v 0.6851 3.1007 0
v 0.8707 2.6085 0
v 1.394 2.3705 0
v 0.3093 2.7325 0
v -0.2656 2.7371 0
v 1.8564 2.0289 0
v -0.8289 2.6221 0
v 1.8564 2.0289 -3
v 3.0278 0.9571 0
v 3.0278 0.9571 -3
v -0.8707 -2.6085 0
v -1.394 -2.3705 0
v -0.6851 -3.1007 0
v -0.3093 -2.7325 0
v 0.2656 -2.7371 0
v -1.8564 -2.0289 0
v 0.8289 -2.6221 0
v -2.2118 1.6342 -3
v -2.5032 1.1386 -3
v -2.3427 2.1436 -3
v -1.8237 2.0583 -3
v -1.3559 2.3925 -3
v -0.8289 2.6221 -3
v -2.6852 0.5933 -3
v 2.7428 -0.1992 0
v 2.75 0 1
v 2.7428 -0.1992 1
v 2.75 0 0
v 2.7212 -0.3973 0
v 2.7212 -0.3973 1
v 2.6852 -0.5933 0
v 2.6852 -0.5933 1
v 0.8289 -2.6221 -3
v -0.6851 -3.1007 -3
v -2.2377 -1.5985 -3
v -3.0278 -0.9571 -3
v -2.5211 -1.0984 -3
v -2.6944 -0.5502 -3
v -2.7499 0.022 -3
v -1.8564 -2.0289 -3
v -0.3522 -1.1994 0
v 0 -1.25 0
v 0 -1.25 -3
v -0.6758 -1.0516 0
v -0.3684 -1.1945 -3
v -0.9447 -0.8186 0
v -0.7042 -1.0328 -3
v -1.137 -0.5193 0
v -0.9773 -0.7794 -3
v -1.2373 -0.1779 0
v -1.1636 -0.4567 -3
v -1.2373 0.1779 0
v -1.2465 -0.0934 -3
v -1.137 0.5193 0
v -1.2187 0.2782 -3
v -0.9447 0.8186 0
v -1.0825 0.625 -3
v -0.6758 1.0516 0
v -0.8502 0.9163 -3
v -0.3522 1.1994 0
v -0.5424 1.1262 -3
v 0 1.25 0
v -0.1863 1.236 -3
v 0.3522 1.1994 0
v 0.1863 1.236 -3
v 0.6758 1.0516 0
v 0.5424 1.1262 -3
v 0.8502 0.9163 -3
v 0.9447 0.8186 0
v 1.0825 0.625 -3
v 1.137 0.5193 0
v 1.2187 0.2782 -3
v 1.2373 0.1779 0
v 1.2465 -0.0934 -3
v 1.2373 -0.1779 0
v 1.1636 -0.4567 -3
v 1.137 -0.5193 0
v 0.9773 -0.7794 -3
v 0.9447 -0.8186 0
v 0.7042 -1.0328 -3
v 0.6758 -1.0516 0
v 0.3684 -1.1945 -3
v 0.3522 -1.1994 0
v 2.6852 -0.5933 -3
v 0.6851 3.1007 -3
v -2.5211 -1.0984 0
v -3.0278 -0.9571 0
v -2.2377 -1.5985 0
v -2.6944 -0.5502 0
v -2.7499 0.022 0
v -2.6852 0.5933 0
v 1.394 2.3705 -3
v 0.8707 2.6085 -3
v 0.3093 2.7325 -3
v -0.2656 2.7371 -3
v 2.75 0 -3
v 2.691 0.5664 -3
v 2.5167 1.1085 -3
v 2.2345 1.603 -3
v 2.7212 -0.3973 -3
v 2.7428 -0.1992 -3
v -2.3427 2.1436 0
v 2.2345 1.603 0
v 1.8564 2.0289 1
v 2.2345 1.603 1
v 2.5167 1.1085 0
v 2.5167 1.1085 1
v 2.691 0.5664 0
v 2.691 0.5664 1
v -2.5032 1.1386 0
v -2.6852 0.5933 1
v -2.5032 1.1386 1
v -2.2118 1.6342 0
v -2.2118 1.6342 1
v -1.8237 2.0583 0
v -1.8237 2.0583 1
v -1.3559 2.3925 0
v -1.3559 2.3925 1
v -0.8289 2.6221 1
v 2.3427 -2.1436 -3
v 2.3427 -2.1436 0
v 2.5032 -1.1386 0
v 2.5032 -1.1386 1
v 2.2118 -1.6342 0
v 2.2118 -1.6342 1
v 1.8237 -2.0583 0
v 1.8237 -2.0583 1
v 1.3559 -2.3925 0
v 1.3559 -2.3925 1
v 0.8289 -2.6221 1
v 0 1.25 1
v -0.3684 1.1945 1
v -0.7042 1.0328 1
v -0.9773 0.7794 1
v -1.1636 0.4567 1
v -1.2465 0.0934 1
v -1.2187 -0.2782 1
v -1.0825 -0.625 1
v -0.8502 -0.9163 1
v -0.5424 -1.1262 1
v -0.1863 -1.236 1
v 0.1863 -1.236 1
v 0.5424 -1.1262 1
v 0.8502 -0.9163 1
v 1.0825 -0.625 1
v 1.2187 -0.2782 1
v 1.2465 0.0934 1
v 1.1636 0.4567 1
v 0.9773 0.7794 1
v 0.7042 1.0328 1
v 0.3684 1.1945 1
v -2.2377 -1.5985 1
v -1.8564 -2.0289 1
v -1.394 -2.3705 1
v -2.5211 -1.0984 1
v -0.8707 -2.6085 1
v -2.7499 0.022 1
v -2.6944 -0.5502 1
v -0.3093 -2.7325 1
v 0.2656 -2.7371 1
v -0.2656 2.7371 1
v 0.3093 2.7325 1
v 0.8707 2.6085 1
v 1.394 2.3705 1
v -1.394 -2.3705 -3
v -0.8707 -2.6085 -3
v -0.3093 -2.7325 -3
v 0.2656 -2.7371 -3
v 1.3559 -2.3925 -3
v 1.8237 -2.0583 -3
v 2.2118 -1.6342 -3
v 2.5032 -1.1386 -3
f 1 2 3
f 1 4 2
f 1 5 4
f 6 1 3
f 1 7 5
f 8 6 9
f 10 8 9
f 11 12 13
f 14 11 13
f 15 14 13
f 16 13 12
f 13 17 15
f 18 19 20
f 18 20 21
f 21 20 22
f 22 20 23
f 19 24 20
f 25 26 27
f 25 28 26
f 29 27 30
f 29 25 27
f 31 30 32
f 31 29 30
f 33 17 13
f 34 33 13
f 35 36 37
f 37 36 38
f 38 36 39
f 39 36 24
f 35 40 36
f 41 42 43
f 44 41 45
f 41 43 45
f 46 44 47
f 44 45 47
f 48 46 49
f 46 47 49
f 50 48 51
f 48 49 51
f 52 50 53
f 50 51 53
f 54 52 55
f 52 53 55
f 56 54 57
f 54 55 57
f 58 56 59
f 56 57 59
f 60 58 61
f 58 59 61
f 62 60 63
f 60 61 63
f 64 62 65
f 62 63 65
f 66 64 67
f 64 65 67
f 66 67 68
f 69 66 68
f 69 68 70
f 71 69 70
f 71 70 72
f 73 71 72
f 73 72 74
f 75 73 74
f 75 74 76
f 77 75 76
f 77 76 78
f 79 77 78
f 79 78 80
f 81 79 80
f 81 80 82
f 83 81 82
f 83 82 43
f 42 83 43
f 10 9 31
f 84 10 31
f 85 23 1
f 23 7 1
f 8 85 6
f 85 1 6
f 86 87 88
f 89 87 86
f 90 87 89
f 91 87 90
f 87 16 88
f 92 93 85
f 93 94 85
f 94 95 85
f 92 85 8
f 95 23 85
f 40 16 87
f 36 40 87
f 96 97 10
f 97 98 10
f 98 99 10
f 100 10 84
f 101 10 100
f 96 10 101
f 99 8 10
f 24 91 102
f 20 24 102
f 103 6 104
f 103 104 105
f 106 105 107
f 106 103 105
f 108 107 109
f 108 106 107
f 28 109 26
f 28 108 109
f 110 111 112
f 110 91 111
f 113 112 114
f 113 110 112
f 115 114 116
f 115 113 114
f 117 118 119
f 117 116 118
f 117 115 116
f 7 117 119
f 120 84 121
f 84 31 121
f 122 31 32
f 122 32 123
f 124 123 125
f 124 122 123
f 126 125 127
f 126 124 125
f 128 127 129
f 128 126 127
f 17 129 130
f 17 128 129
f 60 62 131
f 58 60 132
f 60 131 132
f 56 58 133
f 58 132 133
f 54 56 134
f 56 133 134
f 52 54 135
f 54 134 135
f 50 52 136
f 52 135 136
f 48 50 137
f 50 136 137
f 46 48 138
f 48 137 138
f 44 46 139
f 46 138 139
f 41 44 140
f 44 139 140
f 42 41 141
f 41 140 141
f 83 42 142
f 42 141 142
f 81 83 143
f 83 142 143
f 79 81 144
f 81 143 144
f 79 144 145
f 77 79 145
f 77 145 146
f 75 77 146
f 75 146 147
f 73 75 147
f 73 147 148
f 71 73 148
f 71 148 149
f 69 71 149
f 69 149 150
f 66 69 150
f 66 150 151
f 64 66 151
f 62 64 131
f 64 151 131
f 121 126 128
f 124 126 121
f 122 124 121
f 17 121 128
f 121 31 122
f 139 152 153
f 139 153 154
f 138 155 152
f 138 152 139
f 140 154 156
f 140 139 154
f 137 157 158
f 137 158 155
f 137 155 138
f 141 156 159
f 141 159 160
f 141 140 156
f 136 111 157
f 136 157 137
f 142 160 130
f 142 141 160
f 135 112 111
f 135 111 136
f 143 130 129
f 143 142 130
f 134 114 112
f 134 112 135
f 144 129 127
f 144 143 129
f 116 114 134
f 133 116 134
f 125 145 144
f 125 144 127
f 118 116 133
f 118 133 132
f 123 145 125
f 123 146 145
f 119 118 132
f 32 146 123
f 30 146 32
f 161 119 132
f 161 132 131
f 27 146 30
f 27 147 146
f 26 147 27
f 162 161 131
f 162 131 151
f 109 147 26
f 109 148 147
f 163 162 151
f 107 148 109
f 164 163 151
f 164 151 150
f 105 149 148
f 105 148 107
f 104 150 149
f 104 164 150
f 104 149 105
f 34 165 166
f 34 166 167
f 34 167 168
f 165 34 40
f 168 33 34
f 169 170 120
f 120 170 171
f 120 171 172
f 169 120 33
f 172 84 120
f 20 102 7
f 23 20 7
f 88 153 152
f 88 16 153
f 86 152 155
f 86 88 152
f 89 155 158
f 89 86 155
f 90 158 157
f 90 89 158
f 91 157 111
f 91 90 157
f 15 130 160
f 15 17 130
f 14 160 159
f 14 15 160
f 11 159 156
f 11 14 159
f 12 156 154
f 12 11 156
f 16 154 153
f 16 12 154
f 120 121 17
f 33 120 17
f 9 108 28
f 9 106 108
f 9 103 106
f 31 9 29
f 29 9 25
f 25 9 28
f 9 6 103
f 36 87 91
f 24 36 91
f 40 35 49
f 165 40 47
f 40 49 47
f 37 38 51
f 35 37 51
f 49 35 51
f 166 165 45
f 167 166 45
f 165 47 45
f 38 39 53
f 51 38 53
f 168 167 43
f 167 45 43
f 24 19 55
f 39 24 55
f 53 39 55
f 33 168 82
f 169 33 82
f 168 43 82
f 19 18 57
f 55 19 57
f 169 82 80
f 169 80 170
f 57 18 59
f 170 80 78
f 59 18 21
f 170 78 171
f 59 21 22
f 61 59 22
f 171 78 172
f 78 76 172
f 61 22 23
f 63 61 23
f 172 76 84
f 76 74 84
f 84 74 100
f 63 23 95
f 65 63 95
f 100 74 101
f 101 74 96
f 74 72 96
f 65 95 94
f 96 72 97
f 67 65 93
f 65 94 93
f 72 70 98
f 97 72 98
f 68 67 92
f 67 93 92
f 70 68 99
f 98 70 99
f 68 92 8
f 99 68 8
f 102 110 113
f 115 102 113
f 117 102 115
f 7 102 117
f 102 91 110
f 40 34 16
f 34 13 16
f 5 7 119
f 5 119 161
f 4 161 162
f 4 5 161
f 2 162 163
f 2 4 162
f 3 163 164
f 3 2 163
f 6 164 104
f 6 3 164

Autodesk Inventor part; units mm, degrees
ref_plane "YZ Plane" through (0, 0, 0) normal (1, 0, 0) x (0, 1, 0)
ref_plane "XZ Plane" through (0, 0, 0) normal (0, 1, 0) x (-1, 0, 0)
ref_plane "XY Plane" through (0, 0, 0) normal (0, 0, 1) x (1, 0, 0)
sketch "スケッチ1" plane through (0, 0, 0) normal (0, 0, 1) x (1, 0, 0)
  line L0 (3.0278, 0.9571) -> (2.3427, -2.1436)
  line L1 (2.3427, -2.1436) -> (-0.6851, -3.1007)
  line L2 (-0.6851, -3.1007) -> (-3.0278, -0.9571)
  line L3 (-3.0278, -0.9571) -> (-2.3427, 2.1436)
  line L4 (-2.3427, 2.1436) -> (0.6851, 3.1007)
  line L5 (0.6851, 3.1007) -> (3.0278, 0.9571)
  circle A0 centre (0, 0) radius 2.75
  dimension "d0" = 6.3509
  dimension "d1" = 5.5
extrude "押し出し1" add sketch "スケッチ1" along normal blind 1 contours A0
extrude "押し出し2" add sketch "スケッチ1" against normal blind 3
hole "穴1" at (0, 0, 0) direction (0, 0, -1) diameter 2.5 end through all
hole "穴2" at (0, 0, 0) direction (0, 0, 1) diameter 2.5 end through all
properties part number "ナイロンナットm3" material "ステンレス鋼"
